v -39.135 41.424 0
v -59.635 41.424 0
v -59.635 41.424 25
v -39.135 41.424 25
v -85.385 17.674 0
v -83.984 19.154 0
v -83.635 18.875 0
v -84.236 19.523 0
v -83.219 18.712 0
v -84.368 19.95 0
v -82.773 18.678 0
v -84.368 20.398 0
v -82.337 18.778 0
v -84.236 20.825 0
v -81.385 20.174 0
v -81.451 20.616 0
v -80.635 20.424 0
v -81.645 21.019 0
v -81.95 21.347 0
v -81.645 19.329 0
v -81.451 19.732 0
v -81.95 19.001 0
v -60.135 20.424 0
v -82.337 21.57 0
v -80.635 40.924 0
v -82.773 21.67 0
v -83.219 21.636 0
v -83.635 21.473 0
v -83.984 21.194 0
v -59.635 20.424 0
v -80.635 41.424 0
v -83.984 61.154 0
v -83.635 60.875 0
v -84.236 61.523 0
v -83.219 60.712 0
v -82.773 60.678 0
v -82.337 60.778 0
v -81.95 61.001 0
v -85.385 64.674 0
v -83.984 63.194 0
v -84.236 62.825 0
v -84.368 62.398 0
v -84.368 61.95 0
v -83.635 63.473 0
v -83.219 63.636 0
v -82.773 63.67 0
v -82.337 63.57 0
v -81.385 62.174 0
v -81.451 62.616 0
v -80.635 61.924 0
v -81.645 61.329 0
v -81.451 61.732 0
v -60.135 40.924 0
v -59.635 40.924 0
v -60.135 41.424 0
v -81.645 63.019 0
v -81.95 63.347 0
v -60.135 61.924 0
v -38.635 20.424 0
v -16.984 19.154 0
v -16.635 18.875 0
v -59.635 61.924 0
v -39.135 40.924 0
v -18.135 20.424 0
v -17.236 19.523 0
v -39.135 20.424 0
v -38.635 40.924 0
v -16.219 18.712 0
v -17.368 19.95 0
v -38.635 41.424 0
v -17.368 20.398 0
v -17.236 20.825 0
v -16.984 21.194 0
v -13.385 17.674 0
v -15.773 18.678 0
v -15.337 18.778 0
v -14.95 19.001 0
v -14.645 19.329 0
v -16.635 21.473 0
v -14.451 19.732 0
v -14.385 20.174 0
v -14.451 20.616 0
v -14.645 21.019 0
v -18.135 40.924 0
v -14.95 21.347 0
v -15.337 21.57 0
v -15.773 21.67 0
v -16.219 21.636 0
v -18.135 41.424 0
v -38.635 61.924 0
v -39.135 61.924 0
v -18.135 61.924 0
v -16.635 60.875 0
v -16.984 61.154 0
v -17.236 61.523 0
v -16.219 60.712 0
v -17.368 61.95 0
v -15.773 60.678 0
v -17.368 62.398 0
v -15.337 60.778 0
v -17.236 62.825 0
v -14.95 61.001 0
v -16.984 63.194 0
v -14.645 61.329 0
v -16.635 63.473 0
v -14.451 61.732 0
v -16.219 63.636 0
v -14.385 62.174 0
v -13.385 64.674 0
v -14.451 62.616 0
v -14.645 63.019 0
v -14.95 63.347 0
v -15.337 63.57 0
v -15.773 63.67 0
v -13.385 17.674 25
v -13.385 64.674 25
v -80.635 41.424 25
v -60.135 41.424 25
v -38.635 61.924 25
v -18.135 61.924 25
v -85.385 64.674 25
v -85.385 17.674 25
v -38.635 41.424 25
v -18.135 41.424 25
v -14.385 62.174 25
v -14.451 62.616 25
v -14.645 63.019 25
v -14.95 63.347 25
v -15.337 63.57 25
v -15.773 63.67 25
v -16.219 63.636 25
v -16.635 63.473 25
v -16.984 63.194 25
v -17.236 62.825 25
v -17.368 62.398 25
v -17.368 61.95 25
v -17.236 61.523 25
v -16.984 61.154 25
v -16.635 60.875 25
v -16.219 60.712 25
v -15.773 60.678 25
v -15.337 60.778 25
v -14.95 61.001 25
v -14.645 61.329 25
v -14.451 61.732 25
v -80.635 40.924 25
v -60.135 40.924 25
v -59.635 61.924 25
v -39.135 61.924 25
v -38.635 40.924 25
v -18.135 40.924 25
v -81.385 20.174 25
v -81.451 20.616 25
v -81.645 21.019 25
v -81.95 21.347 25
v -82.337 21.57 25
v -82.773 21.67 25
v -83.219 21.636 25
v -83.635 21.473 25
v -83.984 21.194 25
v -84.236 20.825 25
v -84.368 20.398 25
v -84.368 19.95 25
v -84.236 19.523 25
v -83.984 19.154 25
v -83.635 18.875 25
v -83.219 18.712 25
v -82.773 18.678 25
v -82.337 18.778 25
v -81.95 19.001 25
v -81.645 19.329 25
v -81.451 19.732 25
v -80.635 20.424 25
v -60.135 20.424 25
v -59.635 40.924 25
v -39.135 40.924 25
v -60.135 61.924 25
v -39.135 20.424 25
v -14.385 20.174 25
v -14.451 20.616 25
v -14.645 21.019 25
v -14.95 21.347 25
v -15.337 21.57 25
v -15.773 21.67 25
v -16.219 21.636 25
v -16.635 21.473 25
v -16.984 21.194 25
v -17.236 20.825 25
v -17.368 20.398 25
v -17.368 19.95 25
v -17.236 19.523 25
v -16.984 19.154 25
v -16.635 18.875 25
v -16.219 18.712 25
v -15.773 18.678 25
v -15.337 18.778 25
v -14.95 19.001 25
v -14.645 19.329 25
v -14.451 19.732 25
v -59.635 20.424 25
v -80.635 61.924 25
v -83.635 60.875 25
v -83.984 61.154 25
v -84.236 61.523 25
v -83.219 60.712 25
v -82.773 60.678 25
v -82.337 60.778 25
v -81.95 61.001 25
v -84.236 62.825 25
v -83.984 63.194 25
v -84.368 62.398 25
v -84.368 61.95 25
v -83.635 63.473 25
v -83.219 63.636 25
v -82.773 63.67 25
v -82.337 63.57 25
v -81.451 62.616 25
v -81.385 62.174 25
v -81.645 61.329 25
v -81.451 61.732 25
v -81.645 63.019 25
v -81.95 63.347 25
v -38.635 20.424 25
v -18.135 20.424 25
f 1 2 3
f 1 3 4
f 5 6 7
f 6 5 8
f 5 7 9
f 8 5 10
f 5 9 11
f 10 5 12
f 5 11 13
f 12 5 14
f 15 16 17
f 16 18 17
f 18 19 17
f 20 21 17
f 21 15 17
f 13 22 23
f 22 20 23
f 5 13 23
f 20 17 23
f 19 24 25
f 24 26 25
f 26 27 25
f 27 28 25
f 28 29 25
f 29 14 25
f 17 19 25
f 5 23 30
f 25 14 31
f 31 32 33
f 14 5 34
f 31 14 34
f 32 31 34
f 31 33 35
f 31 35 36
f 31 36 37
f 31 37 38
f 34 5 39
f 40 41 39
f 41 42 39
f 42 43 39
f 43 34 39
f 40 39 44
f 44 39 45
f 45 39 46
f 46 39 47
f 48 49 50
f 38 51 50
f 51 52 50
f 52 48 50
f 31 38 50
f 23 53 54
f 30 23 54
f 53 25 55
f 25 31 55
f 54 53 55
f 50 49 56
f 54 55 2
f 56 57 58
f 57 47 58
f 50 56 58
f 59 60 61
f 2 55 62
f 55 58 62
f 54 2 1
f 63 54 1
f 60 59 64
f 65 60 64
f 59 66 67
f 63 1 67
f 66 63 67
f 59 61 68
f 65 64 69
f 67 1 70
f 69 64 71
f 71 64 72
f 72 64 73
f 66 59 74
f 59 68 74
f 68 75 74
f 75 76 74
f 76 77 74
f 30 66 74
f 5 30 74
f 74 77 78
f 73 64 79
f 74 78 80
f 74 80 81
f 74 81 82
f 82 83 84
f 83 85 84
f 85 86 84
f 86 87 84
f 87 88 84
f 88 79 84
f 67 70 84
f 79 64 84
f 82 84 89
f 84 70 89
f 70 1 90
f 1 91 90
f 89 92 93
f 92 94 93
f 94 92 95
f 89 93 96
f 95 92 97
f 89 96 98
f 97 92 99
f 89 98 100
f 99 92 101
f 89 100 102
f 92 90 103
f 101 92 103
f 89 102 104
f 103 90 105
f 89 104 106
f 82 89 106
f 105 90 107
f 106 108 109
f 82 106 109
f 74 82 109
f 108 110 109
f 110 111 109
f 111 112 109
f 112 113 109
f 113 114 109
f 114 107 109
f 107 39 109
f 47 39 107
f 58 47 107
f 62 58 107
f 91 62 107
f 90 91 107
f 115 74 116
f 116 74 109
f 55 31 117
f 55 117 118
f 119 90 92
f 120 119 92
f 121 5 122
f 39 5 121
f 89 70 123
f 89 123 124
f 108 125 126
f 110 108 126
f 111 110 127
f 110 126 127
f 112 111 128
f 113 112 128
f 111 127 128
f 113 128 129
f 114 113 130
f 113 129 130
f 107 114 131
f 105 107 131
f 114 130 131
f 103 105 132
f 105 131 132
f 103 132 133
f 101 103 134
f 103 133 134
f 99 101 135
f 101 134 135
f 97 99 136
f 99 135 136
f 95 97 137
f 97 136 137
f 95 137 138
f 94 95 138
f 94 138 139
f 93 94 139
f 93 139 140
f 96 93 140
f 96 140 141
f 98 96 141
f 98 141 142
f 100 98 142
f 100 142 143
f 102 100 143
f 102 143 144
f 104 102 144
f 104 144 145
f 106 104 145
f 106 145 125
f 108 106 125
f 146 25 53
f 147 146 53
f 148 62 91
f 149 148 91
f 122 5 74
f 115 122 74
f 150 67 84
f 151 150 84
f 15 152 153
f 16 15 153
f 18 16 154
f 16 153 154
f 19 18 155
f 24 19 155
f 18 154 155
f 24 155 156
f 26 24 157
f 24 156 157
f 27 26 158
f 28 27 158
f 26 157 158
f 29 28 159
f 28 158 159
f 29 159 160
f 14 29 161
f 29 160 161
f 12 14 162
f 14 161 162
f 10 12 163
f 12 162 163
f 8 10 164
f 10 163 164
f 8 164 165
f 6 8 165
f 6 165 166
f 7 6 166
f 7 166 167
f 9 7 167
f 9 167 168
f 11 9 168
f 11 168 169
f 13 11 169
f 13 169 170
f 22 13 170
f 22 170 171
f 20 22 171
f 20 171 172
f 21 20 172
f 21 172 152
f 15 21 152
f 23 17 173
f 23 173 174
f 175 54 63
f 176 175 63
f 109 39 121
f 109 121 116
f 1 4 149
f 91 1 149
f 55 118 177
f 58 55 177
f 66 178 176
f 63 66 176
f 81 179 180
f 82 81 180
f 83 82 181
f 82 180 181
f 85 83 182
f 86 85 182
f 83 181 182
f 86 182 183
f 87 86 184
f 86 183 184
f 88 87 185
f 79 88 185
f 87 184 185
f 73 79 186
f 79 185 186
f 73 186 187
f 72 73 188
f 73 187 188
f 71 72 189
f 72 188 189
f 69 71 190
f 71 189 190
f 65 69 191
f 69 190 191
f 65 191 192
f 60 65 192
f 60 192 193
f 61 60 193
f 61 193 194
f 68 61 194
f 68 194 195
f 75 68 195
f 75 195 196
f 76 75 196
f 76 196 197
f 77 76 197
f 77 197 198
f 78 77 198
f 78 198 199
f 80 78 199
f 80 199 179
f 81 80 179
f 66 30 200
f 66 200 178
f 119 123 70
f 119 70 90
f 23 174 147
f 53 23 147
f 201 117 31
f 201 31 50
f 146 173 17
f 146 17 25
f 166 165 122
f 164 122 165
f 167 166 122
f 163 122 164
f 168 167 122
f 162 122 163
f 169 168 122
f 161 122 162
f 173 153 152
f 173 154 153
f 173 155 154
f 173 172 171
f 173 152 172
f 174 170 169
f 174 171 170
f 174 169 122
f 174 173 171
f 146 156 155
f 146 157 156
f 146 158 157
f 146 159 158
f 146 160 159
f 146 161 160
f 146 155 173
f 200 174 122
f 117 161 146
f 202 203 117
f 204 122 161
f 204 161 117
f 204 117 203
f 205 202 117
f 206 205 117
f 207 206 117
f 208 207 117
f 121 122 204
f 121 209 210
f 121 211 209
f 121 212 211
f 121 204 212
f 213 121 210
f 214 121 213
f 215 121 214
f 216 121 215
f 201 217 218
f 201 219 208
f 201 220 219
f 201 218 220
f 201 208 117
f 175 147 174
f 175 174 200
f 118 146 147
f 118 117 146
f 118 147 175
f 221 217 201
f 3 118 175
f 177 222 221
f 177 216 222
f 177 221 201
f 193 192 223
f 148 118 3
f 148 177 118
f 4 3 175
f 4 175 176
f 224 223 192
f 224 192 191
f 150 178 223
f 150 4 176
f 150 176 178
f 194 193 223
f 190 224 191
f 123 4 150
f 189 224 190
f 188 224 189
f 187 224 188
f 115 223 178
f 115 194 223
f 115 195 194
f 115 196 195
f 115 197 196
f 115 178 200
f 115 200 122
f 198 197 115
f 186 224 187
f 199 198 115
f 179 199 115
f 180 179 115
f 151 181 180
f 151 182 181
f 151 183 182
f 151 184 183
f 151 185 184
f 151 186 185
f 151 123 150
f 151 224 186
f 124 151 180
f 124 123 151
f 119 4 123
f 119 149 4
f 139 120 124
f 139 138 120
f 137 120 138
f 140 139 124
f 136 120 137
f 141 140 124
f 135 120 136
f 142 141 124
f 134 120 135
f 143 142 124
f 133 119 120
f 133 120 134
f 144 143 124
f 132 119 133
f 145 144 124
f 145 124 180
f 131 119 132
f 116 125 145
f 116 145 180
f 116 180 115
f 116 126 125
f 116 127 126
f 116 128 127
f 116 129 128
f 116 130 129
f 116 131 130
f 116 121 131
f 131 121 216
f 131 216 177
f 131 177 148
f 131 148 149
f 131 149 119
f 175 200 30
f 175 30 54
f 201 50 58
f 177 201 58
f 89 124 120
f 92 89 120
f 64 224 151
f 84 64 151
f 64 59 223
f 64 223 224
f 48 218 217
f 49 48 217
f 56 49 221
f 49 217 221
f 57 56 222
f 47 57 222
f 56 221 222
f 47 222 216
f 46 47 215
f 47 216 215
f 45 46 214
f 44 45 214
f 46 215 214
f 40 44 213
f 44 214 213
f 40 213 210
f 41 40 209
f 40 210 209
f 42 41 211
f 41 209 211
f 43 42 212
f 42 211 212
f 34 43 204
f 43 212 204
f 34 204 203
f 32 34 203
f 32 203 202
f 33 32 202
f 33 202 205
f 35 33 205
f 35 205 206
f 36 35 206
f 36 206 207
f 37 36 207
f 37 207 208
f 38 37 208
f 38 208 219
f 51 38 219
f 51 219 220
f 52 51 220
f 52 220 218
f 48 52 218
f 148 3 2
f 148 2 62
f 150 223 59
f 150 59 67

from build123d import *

# Parameters (mm, degrees)
SKETCH_1_W          = 72
SKETCH_1_H          = 47
SKETCH_1_W_2        = 20.5
SKETCH_1_H_2        = 20.5
EXTRUDE_1_DEPTH     = 25
SKETCH_2_R          = 1.5
CUT_EXTRUDE_1_DEPTH = 26


with BuildPart() as part:
    # ｽｹｯﾁ1 → ﾎﾞｽ - 押し出し1 (new body)
    with BuildSketch(Plane.XY):
        with Locations((-49.384838442, 41.173989141)):
            Rectangle(SKETCH_1_W, SKETCH_1_H)
        with Locations((-49.384838442, 30.673989141)):
            Rectangle(SKETCH_1_W_2, SKETCH_1_H_2, mode=Mode.SUBTRACT)
        with Locations((-70.384838442, 30.673989141)):
            Rectangle(SKETCH_1_W_2, SKETCH_1_H_2, mode=Mode.SUBTRACT)
        with Locations((-28.384838442, 30.673989141)):
            Rectangle(SKETCH_1_W_2, SKETCH_1_H_2, mode=Mode.SUBTRACT)
        with Locations((-49.384838442, 51.673989141)):
            Rectangle(SKETCH_1_W_2, SKETCH_1_H_2, mode=Mode.SUBTRACT)
        with Locations((-28.384838442, 51.673989141)):
            Rectangle(SKETCH_1_W_2, SKETCH_1_H_2, mode=Mode.SUBTRACT)
        with Locations((-70.384838442, 51.673989141)):
            Rectangle(SKETCH_1_W_2, SKETCH_1_H_2, mode=Mode.SUBTRACT)
    extrude(amount=EXTRUDE_1_DEPTH)

    # ｽｹｯﾁ2 → ｶｯﾄ - 押し出し1 (cut, through all)
    with BuildSketch(Plane.XY.offset(25)):
        with Locations((-15.884838442, 62.173989141)):
            Circle(SKETCH_2_R)
        with Locations((-82.884838442, 62.173989141)):
            Circle(SKETCH_2_R)
        with Locations((-82.884838442, 20.173989141)):
            Circle(SKETCH_2_R)
        with Locations((-15.884838442, 20.173989141)):
            Circle(SKETCH_2_R)
    extrude(amount=-CUT_EXTRUDE_1_DEPTH, mode=Mode.SUBTRACT)


solid = part.part
